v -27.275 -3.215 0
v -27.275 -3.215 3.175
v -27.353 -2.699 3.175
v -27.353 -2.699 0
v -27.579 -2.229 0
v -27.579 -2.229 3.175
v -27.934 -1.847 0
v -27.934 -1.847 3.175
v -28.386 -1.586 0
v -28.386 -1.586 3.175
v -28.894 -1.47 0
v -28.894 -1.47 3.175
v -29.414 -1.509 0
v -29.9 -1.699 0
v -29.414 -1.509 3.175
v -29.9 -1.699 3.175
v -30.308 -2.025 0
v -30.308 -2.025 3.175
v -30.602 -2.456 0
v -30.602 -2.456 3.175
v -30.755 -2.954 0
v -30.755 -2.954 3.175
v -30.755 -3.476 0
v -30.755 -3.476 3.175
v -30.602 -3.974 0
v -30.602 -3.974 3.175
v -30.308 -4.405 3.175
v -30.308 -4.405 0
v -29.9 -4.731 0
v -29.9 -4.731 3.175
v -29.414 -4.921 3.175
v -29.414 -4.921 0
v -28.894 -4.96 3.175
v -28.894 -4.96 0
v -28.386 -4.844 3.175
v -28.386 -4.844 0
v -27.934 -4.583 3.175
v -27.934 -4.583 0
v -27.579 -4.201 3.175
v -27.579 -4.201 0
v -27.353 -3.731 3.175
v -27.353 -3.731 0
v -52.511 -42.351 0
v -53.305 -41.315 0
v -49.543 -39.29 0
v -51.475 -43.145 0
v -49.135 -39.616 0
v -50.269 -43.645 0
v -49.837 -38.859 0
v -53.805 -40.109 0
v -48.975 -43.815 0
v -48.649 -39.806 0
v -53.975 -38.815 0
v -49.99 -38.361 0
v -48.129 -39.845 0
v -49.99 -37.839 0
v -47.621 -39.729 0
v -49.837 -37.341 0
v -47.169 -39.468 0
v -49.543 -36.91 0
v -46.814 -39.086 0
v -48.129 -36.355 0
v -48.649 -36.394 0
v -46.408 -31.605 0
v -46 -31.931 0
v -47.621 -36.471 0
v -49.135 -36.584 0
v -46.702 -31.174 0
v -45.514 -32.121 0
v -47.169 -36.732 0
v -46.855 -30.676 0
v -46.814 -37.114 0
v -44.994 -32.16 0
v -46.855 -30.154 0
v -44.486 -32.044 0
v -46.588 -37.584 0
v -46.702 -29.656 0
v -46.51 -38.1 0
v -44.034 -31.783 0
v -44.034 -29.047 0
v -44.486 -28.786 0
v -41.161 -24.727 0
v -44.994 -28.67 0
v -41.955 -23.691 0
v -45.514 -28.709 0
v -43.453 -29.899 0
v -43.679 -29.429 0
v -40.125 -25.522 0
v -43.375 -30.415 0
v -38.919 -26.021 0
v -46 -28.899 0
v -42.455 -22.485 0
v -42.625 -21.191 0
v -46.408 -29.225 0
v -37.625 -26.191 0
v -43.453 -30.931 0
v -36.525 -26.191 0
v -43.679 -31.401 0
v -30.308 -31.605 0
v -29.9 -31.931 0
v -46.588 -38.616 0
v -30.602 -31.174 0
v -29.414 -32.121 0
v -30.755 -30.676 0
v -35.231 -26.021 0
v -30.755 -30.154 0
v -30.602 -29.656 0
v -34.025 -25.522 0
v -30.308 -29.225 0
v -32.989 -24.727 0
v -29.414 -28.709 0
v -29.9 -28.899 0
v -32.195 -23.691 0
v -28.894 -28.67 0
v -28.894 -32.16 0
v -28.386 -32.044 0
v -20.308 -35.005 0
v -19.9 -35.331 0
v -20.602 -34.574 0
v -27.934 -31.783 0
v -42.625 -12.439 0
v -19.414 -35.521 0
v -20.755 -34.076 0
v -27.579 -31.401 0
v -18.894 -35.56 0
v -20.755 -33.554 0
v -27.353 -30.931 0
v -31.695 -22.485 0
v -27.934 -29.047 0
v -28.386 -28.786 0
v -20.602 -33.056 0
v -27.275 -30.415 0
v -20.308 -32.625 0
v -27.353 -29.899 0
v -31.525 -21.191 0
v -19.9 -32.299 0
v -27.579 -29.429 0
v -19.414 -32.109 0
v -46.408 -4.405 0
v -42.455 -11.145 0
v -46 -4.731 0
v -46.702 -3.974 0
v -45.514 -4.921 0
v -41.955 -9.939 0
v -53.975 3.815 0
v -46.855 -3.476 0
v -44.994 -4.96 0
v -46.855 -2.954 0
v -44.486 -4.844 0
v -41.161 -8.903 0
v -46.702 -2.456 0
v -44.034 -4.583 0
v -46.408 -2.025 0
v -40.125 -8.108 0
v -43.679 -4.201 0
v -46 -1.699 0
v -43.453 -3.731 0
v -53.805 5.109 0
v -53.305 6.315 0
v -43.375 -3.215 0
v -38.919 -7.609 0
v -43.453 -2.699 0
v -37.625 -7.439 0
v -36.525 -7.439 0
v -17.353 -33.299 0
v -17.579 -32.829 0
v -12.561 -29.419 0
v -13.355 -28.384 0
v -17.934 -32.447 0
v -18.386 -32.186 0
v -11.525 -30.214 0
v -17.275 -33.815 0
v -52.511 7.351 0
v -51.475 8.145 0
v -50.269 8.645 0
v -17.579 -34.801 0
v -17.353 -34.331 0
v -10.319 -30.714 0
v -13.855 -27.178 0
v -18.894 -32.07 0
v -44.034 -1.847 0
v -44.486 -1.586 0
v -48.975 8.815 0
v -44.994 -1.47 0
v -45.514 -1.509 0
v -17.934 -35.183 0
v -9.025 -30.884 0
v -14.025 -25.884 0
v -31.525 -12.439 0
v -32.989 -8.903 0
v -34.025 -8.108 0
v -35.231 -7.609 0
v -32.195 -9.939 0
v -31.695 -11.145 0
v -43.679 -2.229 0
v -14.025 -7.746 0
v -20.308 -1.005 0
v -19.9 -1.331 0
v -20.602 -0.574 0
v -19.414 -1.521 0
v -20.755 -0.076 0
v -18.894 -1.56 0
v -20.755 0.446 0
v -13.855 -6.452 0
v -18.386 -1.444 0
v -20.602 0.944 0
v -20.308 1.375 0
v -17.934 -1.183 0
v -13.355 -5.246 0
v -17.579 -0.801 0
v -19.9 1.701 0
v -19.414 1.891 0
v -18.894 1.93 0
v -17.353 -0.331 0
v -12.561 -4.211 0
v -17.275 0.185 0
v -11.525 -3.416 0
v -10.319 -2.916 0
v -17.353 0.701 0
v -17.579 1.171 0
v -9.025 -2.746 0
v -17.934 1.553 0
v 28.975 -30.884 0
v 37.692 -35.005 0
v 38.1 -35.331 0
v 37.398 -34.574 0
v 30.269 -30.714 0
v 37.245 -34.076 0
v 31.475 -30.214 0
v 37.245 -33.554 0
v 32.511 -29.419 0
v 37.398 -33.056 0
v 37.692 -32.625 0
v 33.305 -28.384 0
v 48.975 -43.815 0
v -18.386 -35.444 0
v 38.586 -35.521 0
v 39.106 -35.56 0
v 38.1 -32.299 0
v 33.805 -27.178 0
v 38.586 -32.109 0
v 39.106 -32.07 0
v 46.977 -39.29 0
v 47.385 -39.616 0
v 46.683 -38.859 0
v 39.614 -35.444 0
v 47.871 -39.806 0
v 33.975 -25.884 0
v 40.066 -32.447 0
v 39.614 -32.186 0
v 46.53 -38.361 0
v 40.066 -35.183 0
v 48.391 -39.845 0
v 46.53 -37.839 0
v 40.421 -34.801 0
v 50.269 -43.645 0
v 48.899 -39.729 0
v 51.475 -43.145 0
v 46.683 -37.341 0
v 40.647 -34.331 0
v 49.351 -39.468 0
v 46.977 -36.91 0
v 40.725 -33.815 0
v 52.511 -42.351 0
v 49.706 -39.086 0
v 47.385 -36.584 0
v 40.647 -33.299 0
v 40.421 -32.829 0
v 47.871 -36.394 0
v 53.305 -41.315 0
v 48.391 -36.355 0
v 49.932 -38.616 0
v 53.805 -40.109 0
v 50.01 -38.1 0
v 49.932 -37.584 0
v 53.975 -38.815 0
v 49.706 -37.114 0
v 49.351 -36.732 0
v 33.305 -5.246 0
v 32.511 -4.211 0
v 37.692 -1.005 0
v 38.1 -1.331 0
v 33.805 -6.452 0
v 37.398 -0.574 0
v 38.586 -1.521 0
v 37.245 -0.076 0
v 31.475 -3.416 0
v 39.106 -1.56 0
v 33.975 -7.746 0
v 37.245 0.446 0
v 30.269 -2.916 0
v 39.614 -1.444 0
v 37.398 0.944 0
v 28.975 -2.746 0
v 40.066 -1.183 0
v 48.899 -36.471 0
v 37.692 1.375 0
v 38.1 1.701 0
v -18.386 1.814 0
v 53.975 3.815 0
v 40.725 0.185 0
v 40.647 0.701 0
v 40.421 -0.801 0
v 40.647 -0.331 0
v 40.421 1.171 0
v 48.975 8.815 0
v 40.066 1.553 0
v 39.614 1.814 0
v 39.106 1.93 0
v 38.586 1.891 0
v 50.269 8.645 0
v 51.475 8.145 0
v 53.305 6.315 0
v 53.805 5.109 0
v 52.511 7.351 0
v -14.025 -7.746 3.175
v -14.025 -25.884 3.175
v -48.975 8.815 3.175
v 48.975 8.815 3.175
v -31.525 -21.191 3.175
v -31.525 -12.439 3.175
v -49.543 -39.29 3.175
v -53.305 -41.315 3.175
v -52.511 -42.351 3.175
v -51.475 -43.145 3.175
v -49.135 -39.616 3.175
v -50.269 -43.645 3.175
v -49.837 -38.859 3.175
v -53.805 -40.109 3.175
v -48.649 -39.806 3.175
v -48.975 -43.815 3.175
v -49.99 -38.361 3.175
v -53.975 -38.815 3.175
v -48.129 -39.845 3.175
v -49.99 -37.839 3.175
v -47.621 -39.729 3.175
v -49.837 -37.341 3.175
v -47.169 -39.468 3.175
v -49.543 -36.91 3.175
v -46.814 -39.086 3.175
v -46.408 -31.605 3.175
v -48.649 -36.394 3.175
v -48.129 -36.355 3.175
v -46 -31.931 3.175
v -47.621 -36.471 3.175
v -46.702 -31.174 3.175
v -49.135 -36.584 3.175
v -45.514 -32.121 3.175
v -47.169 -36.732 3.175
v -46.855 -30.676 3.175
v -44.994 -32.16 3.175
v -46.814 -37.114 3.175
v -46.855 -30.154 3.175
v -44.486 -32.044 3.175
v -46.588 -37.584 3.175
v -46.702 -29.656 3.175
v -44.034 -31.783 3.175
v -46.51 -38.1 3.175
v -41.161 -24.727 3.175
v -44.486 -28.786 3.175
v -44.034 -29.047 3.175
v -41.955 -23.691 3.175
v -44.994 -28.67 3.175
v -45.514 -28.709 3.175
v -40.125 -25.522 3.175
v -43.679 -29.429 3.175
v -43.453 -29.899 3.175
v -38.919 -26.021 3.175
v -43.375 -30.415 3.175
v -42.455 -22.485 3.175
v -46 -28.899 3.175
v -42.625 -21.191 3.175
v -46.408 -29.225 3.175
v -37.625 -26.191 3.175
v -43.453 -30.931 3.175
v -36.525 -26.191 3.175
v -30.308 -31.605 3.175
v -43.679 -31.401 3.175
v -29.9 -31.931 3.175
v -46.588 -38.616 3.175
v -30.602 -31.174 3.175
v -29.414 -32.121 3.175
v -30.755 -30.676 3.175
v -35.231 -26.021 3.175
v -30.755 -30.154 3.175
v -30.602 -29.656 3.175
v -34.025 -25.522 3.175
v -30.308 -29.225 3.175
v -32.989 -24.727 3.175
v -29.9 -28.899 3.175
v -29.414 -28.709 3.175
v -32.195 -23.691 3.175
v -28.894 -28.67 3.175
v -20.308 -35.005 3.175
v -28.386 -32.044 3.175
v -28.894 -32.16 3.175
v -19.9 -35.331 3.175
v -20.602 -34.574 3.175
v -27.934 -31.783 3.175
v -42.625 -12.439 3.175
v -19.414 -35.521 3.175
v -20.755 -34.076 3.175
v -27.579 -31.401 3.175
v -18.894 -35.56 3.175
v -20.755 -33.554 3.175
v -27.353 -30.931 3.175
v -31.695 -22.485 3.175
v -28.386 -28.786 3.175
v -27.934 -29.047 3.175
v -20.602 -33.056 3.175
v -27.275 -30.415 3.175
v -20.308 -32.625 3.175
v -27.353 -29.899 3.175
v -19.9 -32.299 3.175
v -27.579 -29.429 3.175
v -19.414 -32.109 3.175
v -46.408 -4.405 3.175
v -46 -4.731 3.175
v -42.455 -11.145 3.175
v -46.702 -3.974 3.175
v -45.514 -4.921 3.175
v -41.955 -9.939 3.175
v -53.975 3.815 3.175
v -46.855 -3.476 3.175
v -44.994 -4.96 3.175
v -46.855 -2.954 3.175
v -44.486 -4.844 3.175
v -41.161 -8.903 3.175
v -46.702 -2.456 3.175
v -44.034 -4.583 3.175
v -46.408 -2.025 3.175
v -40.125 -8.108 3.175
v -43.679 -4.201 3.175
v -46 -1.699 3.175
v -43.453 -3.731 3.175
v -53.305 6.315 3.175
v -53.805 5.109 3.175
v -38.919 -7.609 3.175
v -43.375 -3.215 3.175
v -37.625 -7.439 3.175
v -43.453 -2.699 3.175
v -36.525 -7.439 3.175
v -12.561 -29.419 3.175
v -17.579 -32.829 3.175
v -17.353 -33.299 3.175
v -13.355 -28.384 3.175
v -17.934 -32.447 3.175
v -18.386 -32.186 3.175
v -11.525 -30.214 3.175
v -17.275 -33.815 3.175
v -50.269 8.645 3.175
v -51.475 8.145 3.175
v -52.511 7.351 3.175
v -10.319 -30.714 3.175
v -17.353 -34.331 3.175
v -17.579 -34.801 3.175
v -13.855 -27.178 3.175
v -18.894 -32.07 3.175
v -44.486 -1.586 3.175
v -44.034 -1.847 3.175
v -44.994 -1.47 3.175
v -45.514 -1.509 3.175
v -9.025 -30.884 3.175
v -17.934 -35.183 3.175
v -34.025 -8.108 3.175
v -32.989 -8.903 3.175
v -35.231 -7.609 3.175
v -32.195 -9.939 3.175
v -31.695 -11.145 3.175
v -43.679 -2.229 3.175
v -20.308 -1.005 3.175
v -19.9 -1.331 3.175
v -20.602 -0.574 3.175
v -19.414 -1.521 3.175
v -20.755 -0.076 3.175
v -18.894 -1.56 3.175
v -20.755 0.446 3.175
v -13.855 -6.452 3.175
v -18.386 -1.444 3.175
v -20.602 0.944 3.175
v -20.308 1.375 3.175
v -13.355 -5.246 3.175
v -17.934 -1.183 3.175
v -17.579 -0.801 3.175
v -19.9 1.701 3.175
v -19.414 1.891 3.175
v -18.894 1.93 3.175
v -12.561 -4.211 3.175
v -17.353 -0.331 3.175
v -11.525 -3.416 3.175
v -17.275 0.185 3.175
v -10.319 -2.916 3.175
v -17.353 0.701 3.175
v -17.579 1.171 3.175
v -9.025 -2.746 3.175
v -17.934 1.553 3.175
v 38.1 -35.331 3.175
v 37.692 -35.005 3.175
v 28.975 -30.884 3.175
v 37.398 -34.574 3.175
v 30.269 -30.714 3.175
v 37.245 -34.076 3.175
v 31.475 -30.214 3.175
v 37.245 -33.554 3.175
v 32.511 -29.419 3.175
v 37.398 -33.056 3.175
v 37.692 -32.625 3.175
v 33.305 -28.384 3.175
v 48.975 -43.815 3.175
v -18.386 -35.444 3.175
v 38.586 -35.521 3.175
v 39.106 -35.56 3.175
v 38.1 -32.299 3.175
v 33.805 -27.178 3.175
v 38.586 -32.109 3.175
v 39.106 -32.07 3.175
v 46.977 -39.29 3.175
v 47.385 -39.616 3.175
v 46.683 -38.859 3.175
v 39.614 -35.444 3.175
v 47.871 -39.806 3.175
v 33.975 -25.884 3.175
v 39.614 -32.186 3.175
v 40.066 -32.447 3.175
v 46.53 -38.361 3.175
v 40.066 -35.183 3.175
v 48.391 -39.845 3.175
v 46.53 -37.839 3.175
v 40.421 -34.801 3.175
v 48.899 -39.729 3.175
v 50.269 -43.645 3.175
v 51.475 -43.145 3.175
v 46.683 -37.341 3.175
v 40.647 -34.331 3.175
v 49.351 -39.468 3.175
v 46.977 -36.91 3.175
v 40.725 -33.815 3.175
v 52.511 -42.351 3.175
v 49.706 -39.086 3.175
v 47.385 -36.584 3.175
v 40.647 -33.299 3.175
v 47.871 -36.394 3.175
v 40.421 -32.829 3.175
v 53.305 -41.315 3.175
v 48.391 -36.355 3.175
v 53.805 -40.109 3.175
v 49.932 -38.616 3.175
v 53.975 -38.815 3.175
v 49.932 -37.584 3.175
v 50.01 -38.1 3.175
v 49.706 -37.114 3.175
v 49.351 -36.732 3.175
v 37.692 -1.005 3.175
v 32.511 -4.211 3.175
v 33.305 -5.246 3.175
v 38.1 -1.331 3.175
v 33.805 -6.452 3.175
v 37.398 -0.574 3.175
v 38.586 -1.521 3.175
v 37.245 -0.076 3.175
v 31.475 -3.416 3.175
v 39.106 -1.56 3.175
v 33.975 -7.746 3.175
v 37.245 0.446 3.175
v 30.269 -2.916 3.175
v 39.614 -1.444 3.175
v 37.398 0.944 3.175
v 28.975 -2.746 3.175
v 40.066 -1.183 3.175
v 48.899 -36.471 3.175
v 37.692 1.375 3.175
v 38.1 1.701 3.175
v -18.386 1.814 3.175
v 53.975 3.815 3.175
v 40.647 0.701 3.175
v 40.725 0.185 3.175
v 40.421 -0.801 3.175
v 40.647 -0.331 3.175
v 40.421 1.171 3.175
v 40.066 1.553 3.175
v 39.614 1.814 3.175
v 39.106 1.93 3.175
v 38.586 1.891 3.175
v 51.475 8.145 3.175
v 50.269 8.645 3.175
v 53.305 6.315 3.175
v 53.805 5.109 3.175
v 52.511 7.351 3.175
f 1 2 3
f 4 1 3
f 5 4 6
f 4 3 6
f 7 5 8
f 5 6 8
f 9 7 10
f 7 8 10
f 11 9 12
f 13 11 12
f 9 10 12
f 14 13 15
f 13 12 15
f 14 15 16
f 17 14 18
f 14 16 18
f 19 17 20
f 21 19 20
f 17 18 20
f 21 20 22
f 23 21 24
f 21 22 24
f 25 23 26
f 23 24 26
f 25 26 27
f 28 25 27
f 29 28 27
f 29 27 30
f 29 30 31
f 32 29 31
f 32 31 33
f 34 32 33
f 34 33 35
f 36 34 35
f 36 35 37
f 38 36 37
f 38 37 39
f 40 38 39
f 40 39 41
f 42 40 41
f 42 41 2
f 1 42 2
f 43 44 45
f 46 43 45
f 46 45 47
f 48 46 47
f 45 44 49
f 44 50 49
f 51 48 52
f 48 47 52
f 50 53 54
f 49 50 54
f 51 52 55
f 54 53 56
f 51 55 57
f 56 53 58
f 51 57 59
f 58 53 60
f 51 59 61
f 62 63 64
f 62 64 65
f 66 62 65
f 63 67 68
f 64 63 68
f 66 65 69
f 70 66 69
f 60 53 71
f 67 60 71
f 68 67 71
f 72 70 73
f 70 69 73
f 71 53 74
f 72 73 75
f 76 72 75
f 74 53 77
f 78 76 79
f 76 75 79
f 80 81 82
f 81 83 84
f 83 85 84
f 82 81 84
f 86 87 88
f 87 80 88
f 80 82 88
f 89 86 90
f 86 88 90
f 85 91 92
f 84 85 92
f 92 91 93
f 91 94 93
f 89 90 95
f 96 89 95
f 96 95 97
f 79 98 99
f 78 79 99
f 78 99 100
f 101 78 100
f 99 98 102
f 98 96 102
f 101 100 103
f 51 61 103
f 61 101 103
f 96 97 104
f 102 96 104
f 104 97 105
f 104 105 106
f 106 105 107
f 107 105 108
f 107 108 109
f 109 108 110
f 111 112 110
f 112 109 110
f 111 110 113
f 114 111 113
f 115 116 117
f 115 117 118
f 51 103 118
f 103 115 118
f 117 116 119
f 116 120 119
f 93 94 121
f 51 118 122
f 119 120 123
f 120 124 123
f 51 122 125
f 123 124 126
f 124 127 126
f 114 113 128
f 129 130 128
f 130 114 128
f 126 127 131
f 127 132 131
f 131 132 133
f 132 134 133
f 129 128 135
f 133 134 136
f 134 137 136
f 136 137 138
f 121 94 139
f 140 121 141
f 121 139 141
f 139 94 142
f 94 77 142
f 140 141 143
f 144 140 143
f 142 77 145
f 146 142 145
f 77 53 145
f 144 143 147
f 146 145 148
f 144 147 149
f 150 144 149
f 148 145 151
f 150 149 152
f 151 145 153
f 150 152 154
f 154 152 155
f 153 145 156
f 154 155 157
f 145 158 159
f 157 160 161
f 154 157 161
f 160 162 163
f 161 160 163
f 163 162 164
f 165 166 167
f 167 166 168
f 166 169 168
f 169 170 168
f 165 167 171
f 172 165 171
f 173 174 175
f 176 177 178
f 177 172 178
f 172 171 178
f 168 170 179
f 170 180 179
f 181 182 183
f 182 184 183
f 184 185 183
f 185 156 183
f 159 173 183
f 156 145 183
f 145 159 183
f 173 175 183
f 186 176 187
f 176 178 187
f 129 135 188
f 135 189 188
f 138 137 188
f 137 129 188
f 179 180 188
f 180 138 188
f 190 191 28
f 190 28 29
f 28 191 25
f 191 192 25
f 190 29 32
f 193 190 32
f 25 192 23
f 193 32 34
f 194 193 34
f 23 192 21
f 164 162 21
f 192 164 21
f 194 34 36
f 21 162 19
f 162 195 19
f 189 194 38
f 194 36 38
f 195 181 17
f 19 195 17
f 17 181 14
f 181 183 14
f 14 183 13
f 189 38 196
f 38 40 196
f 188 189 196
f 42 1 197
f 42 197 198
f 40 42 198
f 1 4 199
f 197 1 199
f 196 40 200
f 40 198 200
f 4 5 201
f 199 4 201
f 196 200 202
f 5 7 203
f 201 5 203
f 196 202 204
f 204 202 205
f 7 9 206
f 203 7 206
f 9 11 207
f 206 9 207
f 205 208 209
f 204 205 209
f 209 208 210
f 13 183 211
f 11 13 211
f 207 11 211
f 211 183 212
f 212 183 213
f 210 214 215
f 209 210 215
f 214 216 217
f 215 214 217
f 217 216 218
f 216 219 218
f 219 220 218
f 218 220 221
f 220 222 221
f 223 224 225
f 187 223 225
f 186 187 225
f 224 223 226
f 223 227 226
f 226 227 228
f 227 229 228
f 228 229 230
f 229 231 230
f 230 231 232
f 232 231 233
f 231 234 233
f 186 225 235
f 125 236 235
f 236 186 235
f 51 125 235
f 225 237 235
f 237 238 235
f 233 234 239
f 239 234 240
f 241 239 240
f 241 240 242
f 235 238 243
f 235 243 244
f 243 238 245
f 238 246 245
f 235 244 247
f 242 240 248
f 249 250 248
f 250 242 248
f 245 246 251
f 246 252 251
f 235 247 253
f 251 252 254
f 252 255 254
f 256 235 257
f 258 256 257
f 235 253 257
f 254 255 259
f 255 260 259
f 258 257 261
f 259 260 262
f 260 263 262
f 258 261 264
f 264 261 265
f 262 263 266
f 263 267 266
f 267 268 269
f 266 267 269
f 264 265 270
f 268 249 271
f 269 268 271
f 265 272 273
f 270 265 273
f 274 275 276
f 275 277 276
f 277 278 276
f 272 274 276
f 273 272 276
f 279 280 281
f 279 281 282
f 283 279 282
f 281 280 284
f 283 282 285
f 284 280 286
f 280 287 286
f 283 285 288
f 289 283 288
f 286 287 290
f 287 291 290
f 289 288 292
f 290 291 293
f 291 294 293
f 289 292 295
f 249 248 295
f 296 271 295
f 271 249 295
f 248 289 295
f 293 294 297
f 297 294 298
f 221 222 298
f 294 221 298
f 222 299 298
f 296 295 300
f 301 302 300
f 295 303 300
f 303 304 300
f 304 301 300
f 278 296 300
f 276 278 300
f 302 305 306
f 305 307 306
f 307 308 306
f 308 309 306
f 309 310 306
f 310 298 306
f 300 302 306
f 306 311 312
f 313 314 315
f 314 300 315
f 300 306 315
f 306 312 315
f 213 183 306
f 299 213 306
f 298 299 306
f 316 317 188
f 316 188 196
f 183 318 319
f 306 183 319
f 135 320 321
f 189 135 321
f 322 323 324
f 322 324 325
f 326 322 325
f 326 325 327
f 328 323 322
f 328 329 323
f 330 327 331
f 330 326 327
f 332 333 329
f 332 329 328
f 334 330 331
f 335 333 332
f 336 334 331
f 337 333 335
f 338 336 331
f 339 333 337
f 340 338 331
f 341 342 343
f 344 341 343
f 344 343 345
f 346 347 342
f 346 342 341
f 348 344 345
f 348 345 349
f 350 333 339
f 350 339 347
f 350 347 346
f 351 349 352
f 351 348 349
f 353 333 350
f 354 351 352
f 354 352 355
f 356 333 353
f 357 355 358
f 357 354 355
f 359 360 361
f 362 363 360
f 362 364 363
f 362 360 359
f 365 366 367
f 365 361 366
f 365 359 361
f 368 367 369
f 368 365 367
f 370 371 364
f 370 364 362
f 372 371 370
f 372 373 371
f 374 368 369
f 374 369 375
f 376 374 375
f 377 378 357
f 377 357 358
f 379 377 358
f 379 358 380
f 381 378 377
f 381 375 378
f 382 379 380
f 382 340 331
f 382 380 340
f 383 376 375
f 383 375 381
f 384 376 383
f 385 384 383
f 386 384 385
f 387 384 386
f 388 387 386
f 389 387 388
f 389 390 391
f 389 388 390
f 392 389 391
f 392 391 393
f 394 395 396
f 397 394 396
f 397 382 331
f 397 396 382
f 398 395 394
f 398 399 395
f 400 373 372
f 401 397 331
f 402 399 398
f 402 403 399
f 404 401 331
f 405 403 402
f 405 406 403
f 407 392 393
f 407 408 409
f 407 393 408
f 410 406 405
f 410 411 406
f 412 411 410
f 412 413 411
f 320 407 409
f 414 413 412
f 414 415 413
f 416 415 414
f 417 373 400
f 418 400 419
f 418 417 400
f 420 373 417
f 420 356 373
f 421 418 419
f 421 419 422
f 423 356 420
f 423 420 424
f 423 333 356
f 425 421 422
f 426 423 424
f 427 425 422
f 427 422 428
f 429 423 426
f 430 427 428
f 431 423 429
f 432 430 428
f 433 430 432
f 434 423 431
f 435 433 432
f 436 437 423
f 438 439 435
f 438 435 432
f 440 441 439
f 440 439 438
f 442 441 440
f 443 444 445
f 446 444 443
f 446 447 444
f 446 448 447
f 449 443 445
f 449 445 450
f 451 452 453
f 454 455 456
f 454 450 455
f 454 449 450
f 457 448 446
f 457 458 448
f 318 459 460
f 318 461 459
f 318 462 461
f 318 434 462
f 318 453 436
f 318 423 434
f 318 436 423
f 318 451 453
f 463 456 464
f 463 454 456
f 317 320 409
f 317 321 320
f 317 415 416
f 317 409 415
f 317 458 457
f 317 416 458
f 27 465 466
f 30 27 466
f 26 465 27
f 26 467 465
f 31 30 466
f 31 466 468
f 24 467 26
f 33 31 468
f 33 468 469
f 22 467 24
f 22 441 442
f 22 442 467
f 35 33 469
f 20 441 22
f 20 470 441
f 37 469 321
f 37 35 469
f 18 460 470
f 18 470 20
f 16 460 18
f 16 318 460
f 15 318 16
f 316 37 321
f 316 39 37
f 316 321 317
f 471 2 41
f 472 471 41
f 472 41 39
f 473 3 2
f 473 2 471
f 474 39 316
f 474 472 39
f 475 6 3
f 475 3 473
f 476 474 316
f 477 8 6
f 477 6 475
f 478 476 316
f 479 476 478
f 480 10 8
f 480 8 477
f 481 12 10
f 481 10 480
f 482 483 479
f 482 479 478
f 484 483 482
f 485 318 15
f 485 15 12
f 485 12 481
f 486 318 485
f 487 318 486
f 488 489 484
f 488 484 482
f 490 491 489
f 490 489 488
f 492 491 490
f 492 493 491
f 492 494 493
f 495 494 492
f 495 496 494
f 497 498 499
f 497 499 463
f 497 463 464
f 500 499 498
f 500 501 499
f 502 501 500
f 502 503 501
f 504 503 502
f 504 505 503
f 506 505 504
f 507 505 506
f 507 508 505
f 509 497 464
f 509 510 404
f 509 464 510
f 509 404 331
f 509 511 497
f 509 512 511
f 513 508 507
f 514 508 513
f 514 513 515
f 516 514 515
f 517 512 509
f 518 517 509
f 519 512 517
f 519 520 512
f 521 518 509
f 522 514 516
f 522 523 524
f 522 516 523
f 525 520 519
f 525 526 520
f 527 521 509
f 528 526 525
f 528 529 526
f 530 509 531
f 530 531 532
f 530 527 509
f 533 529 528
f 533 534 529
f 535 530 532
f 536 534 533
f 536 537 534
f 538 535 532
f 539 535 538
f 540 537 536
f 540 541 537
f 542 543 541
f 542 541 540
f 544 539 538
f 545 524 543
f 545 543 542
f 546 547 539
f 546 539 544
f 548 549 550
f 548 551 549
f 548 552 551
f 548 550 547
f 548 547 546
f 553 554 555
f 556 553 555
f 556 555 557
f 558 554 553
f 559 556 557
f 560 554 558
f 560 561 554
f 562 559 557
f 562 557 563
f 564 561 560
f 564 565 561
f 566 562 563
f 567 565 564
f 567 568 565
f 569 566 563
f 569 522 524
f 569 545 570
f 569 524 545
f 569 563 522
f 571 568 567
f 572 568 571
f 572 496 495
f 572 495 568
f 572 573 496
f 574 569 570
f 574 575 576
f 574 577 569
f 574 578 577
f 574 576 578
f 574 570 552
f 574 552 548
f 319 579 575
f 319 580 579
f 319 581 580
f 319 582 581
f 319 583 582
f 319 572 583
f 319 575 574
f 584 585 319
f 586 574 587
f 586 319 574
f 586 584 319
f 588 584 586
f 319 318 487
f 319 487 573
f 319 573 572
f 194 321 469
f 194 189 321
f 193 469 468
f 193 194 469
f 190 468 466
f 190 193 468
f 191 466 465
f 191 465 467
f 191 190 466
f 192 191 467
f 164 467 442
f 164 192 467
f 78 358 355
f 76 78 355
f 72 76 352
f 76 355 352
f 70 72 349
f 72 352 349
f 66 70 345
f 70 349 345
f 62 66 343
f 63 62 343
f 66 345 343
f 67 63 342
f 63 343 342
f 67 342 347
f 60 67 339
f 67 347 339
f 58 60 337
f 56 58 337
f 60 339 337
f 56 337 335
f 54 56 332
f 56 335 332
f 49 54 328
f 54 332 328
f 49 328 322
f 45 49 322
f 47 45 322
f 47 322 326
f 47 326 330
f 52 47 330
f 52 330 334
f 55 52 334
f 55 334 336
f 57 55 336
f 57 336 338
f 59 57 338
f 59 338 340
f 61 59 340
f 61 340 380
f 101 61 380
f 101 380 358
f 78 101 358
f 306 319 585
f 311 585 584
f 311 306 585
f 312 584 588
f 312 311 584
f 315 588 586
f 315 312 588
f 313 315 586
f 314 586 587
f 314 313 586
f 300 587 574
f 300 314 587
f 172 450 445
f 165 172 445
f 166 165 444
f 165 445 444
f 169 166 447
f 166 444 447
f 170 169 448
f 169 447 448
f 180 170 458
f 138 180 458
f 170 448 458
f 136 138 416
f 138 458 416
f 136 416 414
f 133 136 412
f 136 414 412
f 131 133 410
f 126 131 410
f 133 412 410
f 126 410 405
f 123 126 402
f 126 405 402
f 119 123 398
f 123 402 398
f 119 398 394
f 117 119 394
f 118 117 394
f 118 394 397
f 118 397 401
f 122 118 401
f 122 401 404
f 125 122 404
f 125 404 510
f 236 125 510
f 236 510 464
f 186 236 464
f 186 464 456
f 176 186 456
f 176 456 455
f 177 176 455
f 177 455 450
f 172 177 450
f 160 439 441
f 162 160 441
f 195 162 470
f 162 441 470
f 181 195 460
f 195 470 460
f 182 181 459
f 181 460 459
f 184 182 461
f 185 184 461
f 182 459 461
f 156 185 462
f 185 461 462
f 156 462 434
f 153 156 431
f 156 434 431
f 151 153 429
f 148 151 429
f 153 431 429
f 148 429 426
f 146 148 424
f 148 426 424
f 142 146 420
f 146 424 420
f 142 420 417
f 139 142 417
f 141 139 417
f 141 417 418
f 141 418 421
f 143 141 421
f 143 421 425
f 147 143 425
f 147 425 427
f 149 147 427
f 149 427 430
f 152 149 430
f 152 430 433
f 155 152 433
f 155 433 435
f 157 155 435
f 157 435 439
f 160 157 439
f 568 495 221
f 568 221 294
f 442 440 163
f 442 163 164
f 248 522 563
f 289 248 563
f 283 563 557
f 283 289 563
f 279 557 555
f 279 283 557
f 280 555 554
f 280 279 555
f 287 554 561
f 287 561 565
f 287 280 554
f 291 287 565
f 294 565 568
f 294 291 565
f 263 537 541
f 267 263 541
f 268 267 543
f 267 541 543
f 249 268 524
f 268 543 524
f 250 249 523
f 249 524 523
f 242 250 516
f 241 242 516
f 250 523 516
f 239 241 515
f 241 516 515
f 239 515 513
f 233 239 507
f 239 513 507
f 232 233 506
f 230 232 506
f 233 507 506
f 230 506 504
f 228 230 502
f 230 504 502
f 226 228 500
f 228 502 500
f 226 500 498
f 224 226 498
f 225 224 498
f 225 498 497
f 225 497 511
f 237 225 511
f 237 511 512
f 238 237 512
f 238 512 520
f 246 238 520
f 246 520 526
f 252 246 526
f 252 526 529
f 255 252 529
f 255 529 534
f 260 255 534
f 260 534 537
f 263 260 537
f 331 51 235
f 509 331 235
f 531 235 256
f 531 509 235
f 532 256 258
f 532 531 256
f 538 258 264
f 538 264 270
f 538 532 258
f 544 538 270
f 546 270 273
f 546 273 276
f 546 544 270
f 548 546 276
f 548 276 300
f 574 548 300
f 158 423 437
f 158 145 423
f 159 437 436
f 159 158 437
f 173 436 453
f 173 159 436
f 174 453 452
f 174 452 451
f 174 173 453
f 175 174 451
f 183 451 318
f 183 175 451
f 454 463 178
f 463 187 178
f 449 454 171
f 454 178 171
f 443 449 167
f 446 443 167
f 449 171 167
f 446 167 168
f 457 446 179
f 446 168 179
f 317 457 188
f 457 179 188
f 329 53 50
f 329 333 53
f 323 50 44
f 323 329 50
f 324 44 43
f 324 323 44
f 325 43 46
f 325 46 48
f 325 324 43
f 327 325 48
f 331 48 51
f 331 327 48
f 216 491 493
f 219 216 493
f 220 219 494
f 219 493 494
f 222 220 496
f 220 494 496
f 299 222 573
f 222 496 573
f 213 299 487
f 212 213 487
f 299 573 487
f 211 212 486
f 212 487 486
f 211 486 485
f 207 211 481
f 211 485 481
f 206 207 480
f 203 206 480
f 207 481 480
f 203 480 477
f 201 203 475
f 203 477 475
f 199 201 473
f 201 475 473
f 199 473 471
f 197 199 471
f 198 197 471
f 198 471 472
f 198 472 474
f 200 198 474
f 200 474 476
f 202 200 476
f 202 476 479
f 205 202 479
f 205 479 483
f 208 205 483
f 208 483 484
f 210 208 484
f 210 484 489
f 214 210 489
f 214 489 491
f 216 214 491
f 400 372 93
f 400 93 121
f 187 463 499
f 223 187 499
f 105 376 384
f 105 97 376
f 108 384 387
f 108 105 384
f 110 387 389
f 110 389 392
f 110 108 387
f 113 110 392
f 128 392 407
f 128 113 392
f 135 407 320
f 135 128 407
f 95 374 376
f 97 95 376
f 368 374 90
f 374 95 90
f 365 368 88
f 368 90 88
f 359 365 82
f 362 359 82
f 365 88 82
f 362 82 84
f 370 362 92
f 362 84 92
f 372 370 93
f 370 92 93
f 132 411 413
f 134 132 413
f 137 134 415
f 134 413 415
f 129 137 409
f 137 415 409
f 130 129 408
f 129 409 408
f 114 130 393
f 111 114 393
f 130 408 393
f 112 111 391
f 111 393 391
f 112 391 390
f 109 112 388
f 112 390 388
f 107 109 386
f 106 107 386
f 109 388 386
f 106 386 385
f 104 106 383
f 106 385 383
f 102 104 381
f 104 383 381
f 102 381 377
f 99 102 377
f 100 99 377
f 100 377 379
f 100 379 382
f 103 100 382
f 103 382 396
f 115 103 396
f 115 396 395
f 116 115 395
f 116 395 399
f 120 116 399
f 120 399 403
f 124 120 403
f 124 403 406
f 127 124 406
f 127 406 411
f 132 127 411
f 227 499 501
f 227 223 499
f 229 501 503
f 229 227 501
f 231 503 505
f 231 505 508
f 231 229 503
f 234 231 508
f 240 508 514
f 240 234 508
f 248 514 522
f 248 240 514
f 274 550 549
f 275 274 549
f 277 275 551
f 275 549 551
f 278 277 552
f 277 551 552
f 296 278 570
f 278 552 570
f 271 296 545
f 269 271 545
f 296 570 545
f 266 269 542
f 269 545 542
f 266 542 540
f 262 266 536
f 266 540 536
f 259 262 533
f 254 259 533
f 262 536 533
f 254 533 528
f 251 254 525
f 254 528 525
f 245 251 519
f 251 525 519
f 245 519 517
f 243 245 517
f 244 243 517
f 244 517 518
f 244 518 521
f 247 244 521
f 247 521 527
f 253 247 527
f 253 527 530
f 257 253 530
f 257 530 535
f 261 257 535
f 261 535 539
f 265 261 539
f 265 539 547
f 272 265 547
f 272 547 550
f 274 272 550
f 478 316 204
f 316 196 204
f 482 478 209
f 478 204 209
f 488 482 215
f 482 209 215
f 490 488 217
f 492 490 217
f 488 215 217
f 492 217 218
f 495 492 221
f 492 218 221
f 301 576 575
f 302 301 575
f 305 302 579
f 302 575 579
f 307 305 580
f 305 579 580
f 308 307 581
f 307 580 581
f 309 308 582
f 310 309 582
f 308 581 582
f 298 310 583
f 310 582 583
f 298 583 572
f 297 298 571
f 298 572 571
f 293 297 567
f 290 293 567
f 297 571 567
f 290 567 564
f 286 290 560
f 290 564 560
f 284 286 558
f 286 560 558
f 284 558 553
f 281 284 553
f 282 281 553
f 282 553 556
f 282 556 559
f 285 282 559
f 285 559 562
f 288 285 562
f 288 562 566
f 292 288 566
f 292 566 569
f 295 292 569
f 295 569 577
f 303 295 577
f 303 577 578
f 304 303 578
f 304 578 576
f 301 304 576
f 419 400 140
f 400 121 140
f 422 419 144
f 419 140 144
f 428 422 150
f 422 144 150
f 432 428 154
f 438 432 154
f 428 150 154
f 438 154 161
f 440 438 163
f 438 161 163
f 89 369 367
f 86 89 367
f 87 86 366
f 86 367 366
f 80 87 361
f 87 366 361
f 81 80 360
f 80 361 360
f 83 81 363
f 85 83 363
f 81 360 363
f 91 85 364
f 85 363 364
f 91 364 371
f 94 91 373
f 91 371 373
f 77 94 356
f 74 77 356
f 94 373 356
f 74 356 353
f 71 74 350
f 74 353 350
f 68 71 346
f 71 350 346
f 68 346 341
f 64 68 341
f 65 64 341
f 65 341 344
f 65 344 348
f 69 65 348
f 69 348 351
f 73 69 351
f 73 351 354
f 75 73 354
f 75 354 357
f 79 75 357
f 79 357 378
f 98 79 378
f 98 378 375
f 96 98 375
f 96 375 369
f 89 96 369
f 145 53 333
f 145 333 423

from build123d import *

# Parameters (mm, degrees)
SKETCH1_W           = 107.95
SKETCH1_H           = 87.63
BOSS_EXTRUDE1_DEPTH = 3.175
SKETCH2_R           = 1.75
CUT_EXTRUDE1_DEPTH  = 4.175
SKETCH3_R           = 1.75
SKETCH3_W           = 48
SKETCH3_H           = 28.137931034
SKETCH3_W_2         = 11.1
SKETCH3_H_2         = 18.752795032
CUT_EXTRUDE2_DEPTH  = 4.175
SKETCH4_W           = 107.95
SKETCH4_H           = 35
CUT_EXTRUDE3_DEPTH  = 4.175
FILLET1_R           = 5


with BuildPart() as part:
    # Sketch1 → Boss-Extrude1 (new body)
    with BuildSketch(Plane.XY):
        Rectangle(SKETCH1_W, SKETCH1_H)
    extrude(amount=BOSS_EXTRUDE1_DEPTH)

    # Sketch2 → Cut-Extrude1 (cut, through all)
    with BuildSketch(Plane.XY.offset(3.175)):
        with Locations((-48.26, 38.1)):
            Circle(SKETCH2_R)
        with Locations((48.26, 38.1)):
            Circle(SKETCH2_R)
        with Locations((48.26, -38.1)):
            Circle(SKETCH2_R)
        with Locations((-48.26, -38.1)):
            Circle(SKETCH2_R)
    extrude(amount=-CUT_EXTRUDE1_DEPTH, mode=Mode.SUBTRACT)

    # Sketch3 → Cut-Extrude2 (cut, through all)
    with BuildSketch(Plane.XY.offset(3.175)):
        with Locations((-29.025, -3.215)):
            Circle(SKETCH3_R)
        with Locations((-29.025, -30.415)):
            Circle(SKETCH3_R)
        with Locations((-45.125, -30.415)):
            Circle(SKETCH3_R)
        with Locations((-45.125, -3.215)):
            Circle(SKETCH3_R)
        with Locations((-19.025, -33.815)):
            Circle(SKETCH3_R)
        with Locations((38.975, -33.815)):
            Circle(SKETCH3_R)
        with Locations((38.975, 0.185)):
            Circle(SKETCH3_R)
        with Locations((-19.025, 0.185)):
            Circle(SKETCH3_R)
        with Locations((9.975, -16.815)):
            Rectangle(SKETCH3_W, SKETCH3_H)
        with Locations((-37.075, -16.815)):
            Rectangle(SKETCH3_W_2, SKETCH3_H_2)
    extrude(amount=-CUT_EXTRUDE2_DEPTH, mode=Mode.SUBTRACT)

    # Sketch4 → Cut-Extrude3 (cut, through all)
    with BuildSketch(Plane.XY.offset(3.175)):
        with Locations((0, 26.315)):
            Rectangle(SKETCH4_W, SKETCH4_H)
    extrude(amount=-CUT_EXTRUDE3_DEPTH, mode=Mode.SUBTRACT)

    # Fillet1
    fillet1_edges = [part.edges().sort_by_distance(p)[0] for p in [
        (-53.975, 8.815, 1.5875),
        (53.975, 8.815, 1.5875),
        (33.975, -2.746034483, 1.5875),
        (33.975, -30.883965517, 1.5875),
        (-14.025, -30.883965517, 1.5875),
        (-14.025, -2.746034483, 1.5875),
        (-31.525, -7.438602484, 1.5875),
        (-31.525, -26.191397516, 1.5875),
        (-42.625, -26.191397516, 1.5875),
        (-42.625, -7.438602484, 1.5875),
        (53.975, -43.815, 1.5875),
        (-53.975, -43.815, 1.5875),
    ]]
    fillet(fillet1_edges, radius=FILLET1_R)


solid = part.part
